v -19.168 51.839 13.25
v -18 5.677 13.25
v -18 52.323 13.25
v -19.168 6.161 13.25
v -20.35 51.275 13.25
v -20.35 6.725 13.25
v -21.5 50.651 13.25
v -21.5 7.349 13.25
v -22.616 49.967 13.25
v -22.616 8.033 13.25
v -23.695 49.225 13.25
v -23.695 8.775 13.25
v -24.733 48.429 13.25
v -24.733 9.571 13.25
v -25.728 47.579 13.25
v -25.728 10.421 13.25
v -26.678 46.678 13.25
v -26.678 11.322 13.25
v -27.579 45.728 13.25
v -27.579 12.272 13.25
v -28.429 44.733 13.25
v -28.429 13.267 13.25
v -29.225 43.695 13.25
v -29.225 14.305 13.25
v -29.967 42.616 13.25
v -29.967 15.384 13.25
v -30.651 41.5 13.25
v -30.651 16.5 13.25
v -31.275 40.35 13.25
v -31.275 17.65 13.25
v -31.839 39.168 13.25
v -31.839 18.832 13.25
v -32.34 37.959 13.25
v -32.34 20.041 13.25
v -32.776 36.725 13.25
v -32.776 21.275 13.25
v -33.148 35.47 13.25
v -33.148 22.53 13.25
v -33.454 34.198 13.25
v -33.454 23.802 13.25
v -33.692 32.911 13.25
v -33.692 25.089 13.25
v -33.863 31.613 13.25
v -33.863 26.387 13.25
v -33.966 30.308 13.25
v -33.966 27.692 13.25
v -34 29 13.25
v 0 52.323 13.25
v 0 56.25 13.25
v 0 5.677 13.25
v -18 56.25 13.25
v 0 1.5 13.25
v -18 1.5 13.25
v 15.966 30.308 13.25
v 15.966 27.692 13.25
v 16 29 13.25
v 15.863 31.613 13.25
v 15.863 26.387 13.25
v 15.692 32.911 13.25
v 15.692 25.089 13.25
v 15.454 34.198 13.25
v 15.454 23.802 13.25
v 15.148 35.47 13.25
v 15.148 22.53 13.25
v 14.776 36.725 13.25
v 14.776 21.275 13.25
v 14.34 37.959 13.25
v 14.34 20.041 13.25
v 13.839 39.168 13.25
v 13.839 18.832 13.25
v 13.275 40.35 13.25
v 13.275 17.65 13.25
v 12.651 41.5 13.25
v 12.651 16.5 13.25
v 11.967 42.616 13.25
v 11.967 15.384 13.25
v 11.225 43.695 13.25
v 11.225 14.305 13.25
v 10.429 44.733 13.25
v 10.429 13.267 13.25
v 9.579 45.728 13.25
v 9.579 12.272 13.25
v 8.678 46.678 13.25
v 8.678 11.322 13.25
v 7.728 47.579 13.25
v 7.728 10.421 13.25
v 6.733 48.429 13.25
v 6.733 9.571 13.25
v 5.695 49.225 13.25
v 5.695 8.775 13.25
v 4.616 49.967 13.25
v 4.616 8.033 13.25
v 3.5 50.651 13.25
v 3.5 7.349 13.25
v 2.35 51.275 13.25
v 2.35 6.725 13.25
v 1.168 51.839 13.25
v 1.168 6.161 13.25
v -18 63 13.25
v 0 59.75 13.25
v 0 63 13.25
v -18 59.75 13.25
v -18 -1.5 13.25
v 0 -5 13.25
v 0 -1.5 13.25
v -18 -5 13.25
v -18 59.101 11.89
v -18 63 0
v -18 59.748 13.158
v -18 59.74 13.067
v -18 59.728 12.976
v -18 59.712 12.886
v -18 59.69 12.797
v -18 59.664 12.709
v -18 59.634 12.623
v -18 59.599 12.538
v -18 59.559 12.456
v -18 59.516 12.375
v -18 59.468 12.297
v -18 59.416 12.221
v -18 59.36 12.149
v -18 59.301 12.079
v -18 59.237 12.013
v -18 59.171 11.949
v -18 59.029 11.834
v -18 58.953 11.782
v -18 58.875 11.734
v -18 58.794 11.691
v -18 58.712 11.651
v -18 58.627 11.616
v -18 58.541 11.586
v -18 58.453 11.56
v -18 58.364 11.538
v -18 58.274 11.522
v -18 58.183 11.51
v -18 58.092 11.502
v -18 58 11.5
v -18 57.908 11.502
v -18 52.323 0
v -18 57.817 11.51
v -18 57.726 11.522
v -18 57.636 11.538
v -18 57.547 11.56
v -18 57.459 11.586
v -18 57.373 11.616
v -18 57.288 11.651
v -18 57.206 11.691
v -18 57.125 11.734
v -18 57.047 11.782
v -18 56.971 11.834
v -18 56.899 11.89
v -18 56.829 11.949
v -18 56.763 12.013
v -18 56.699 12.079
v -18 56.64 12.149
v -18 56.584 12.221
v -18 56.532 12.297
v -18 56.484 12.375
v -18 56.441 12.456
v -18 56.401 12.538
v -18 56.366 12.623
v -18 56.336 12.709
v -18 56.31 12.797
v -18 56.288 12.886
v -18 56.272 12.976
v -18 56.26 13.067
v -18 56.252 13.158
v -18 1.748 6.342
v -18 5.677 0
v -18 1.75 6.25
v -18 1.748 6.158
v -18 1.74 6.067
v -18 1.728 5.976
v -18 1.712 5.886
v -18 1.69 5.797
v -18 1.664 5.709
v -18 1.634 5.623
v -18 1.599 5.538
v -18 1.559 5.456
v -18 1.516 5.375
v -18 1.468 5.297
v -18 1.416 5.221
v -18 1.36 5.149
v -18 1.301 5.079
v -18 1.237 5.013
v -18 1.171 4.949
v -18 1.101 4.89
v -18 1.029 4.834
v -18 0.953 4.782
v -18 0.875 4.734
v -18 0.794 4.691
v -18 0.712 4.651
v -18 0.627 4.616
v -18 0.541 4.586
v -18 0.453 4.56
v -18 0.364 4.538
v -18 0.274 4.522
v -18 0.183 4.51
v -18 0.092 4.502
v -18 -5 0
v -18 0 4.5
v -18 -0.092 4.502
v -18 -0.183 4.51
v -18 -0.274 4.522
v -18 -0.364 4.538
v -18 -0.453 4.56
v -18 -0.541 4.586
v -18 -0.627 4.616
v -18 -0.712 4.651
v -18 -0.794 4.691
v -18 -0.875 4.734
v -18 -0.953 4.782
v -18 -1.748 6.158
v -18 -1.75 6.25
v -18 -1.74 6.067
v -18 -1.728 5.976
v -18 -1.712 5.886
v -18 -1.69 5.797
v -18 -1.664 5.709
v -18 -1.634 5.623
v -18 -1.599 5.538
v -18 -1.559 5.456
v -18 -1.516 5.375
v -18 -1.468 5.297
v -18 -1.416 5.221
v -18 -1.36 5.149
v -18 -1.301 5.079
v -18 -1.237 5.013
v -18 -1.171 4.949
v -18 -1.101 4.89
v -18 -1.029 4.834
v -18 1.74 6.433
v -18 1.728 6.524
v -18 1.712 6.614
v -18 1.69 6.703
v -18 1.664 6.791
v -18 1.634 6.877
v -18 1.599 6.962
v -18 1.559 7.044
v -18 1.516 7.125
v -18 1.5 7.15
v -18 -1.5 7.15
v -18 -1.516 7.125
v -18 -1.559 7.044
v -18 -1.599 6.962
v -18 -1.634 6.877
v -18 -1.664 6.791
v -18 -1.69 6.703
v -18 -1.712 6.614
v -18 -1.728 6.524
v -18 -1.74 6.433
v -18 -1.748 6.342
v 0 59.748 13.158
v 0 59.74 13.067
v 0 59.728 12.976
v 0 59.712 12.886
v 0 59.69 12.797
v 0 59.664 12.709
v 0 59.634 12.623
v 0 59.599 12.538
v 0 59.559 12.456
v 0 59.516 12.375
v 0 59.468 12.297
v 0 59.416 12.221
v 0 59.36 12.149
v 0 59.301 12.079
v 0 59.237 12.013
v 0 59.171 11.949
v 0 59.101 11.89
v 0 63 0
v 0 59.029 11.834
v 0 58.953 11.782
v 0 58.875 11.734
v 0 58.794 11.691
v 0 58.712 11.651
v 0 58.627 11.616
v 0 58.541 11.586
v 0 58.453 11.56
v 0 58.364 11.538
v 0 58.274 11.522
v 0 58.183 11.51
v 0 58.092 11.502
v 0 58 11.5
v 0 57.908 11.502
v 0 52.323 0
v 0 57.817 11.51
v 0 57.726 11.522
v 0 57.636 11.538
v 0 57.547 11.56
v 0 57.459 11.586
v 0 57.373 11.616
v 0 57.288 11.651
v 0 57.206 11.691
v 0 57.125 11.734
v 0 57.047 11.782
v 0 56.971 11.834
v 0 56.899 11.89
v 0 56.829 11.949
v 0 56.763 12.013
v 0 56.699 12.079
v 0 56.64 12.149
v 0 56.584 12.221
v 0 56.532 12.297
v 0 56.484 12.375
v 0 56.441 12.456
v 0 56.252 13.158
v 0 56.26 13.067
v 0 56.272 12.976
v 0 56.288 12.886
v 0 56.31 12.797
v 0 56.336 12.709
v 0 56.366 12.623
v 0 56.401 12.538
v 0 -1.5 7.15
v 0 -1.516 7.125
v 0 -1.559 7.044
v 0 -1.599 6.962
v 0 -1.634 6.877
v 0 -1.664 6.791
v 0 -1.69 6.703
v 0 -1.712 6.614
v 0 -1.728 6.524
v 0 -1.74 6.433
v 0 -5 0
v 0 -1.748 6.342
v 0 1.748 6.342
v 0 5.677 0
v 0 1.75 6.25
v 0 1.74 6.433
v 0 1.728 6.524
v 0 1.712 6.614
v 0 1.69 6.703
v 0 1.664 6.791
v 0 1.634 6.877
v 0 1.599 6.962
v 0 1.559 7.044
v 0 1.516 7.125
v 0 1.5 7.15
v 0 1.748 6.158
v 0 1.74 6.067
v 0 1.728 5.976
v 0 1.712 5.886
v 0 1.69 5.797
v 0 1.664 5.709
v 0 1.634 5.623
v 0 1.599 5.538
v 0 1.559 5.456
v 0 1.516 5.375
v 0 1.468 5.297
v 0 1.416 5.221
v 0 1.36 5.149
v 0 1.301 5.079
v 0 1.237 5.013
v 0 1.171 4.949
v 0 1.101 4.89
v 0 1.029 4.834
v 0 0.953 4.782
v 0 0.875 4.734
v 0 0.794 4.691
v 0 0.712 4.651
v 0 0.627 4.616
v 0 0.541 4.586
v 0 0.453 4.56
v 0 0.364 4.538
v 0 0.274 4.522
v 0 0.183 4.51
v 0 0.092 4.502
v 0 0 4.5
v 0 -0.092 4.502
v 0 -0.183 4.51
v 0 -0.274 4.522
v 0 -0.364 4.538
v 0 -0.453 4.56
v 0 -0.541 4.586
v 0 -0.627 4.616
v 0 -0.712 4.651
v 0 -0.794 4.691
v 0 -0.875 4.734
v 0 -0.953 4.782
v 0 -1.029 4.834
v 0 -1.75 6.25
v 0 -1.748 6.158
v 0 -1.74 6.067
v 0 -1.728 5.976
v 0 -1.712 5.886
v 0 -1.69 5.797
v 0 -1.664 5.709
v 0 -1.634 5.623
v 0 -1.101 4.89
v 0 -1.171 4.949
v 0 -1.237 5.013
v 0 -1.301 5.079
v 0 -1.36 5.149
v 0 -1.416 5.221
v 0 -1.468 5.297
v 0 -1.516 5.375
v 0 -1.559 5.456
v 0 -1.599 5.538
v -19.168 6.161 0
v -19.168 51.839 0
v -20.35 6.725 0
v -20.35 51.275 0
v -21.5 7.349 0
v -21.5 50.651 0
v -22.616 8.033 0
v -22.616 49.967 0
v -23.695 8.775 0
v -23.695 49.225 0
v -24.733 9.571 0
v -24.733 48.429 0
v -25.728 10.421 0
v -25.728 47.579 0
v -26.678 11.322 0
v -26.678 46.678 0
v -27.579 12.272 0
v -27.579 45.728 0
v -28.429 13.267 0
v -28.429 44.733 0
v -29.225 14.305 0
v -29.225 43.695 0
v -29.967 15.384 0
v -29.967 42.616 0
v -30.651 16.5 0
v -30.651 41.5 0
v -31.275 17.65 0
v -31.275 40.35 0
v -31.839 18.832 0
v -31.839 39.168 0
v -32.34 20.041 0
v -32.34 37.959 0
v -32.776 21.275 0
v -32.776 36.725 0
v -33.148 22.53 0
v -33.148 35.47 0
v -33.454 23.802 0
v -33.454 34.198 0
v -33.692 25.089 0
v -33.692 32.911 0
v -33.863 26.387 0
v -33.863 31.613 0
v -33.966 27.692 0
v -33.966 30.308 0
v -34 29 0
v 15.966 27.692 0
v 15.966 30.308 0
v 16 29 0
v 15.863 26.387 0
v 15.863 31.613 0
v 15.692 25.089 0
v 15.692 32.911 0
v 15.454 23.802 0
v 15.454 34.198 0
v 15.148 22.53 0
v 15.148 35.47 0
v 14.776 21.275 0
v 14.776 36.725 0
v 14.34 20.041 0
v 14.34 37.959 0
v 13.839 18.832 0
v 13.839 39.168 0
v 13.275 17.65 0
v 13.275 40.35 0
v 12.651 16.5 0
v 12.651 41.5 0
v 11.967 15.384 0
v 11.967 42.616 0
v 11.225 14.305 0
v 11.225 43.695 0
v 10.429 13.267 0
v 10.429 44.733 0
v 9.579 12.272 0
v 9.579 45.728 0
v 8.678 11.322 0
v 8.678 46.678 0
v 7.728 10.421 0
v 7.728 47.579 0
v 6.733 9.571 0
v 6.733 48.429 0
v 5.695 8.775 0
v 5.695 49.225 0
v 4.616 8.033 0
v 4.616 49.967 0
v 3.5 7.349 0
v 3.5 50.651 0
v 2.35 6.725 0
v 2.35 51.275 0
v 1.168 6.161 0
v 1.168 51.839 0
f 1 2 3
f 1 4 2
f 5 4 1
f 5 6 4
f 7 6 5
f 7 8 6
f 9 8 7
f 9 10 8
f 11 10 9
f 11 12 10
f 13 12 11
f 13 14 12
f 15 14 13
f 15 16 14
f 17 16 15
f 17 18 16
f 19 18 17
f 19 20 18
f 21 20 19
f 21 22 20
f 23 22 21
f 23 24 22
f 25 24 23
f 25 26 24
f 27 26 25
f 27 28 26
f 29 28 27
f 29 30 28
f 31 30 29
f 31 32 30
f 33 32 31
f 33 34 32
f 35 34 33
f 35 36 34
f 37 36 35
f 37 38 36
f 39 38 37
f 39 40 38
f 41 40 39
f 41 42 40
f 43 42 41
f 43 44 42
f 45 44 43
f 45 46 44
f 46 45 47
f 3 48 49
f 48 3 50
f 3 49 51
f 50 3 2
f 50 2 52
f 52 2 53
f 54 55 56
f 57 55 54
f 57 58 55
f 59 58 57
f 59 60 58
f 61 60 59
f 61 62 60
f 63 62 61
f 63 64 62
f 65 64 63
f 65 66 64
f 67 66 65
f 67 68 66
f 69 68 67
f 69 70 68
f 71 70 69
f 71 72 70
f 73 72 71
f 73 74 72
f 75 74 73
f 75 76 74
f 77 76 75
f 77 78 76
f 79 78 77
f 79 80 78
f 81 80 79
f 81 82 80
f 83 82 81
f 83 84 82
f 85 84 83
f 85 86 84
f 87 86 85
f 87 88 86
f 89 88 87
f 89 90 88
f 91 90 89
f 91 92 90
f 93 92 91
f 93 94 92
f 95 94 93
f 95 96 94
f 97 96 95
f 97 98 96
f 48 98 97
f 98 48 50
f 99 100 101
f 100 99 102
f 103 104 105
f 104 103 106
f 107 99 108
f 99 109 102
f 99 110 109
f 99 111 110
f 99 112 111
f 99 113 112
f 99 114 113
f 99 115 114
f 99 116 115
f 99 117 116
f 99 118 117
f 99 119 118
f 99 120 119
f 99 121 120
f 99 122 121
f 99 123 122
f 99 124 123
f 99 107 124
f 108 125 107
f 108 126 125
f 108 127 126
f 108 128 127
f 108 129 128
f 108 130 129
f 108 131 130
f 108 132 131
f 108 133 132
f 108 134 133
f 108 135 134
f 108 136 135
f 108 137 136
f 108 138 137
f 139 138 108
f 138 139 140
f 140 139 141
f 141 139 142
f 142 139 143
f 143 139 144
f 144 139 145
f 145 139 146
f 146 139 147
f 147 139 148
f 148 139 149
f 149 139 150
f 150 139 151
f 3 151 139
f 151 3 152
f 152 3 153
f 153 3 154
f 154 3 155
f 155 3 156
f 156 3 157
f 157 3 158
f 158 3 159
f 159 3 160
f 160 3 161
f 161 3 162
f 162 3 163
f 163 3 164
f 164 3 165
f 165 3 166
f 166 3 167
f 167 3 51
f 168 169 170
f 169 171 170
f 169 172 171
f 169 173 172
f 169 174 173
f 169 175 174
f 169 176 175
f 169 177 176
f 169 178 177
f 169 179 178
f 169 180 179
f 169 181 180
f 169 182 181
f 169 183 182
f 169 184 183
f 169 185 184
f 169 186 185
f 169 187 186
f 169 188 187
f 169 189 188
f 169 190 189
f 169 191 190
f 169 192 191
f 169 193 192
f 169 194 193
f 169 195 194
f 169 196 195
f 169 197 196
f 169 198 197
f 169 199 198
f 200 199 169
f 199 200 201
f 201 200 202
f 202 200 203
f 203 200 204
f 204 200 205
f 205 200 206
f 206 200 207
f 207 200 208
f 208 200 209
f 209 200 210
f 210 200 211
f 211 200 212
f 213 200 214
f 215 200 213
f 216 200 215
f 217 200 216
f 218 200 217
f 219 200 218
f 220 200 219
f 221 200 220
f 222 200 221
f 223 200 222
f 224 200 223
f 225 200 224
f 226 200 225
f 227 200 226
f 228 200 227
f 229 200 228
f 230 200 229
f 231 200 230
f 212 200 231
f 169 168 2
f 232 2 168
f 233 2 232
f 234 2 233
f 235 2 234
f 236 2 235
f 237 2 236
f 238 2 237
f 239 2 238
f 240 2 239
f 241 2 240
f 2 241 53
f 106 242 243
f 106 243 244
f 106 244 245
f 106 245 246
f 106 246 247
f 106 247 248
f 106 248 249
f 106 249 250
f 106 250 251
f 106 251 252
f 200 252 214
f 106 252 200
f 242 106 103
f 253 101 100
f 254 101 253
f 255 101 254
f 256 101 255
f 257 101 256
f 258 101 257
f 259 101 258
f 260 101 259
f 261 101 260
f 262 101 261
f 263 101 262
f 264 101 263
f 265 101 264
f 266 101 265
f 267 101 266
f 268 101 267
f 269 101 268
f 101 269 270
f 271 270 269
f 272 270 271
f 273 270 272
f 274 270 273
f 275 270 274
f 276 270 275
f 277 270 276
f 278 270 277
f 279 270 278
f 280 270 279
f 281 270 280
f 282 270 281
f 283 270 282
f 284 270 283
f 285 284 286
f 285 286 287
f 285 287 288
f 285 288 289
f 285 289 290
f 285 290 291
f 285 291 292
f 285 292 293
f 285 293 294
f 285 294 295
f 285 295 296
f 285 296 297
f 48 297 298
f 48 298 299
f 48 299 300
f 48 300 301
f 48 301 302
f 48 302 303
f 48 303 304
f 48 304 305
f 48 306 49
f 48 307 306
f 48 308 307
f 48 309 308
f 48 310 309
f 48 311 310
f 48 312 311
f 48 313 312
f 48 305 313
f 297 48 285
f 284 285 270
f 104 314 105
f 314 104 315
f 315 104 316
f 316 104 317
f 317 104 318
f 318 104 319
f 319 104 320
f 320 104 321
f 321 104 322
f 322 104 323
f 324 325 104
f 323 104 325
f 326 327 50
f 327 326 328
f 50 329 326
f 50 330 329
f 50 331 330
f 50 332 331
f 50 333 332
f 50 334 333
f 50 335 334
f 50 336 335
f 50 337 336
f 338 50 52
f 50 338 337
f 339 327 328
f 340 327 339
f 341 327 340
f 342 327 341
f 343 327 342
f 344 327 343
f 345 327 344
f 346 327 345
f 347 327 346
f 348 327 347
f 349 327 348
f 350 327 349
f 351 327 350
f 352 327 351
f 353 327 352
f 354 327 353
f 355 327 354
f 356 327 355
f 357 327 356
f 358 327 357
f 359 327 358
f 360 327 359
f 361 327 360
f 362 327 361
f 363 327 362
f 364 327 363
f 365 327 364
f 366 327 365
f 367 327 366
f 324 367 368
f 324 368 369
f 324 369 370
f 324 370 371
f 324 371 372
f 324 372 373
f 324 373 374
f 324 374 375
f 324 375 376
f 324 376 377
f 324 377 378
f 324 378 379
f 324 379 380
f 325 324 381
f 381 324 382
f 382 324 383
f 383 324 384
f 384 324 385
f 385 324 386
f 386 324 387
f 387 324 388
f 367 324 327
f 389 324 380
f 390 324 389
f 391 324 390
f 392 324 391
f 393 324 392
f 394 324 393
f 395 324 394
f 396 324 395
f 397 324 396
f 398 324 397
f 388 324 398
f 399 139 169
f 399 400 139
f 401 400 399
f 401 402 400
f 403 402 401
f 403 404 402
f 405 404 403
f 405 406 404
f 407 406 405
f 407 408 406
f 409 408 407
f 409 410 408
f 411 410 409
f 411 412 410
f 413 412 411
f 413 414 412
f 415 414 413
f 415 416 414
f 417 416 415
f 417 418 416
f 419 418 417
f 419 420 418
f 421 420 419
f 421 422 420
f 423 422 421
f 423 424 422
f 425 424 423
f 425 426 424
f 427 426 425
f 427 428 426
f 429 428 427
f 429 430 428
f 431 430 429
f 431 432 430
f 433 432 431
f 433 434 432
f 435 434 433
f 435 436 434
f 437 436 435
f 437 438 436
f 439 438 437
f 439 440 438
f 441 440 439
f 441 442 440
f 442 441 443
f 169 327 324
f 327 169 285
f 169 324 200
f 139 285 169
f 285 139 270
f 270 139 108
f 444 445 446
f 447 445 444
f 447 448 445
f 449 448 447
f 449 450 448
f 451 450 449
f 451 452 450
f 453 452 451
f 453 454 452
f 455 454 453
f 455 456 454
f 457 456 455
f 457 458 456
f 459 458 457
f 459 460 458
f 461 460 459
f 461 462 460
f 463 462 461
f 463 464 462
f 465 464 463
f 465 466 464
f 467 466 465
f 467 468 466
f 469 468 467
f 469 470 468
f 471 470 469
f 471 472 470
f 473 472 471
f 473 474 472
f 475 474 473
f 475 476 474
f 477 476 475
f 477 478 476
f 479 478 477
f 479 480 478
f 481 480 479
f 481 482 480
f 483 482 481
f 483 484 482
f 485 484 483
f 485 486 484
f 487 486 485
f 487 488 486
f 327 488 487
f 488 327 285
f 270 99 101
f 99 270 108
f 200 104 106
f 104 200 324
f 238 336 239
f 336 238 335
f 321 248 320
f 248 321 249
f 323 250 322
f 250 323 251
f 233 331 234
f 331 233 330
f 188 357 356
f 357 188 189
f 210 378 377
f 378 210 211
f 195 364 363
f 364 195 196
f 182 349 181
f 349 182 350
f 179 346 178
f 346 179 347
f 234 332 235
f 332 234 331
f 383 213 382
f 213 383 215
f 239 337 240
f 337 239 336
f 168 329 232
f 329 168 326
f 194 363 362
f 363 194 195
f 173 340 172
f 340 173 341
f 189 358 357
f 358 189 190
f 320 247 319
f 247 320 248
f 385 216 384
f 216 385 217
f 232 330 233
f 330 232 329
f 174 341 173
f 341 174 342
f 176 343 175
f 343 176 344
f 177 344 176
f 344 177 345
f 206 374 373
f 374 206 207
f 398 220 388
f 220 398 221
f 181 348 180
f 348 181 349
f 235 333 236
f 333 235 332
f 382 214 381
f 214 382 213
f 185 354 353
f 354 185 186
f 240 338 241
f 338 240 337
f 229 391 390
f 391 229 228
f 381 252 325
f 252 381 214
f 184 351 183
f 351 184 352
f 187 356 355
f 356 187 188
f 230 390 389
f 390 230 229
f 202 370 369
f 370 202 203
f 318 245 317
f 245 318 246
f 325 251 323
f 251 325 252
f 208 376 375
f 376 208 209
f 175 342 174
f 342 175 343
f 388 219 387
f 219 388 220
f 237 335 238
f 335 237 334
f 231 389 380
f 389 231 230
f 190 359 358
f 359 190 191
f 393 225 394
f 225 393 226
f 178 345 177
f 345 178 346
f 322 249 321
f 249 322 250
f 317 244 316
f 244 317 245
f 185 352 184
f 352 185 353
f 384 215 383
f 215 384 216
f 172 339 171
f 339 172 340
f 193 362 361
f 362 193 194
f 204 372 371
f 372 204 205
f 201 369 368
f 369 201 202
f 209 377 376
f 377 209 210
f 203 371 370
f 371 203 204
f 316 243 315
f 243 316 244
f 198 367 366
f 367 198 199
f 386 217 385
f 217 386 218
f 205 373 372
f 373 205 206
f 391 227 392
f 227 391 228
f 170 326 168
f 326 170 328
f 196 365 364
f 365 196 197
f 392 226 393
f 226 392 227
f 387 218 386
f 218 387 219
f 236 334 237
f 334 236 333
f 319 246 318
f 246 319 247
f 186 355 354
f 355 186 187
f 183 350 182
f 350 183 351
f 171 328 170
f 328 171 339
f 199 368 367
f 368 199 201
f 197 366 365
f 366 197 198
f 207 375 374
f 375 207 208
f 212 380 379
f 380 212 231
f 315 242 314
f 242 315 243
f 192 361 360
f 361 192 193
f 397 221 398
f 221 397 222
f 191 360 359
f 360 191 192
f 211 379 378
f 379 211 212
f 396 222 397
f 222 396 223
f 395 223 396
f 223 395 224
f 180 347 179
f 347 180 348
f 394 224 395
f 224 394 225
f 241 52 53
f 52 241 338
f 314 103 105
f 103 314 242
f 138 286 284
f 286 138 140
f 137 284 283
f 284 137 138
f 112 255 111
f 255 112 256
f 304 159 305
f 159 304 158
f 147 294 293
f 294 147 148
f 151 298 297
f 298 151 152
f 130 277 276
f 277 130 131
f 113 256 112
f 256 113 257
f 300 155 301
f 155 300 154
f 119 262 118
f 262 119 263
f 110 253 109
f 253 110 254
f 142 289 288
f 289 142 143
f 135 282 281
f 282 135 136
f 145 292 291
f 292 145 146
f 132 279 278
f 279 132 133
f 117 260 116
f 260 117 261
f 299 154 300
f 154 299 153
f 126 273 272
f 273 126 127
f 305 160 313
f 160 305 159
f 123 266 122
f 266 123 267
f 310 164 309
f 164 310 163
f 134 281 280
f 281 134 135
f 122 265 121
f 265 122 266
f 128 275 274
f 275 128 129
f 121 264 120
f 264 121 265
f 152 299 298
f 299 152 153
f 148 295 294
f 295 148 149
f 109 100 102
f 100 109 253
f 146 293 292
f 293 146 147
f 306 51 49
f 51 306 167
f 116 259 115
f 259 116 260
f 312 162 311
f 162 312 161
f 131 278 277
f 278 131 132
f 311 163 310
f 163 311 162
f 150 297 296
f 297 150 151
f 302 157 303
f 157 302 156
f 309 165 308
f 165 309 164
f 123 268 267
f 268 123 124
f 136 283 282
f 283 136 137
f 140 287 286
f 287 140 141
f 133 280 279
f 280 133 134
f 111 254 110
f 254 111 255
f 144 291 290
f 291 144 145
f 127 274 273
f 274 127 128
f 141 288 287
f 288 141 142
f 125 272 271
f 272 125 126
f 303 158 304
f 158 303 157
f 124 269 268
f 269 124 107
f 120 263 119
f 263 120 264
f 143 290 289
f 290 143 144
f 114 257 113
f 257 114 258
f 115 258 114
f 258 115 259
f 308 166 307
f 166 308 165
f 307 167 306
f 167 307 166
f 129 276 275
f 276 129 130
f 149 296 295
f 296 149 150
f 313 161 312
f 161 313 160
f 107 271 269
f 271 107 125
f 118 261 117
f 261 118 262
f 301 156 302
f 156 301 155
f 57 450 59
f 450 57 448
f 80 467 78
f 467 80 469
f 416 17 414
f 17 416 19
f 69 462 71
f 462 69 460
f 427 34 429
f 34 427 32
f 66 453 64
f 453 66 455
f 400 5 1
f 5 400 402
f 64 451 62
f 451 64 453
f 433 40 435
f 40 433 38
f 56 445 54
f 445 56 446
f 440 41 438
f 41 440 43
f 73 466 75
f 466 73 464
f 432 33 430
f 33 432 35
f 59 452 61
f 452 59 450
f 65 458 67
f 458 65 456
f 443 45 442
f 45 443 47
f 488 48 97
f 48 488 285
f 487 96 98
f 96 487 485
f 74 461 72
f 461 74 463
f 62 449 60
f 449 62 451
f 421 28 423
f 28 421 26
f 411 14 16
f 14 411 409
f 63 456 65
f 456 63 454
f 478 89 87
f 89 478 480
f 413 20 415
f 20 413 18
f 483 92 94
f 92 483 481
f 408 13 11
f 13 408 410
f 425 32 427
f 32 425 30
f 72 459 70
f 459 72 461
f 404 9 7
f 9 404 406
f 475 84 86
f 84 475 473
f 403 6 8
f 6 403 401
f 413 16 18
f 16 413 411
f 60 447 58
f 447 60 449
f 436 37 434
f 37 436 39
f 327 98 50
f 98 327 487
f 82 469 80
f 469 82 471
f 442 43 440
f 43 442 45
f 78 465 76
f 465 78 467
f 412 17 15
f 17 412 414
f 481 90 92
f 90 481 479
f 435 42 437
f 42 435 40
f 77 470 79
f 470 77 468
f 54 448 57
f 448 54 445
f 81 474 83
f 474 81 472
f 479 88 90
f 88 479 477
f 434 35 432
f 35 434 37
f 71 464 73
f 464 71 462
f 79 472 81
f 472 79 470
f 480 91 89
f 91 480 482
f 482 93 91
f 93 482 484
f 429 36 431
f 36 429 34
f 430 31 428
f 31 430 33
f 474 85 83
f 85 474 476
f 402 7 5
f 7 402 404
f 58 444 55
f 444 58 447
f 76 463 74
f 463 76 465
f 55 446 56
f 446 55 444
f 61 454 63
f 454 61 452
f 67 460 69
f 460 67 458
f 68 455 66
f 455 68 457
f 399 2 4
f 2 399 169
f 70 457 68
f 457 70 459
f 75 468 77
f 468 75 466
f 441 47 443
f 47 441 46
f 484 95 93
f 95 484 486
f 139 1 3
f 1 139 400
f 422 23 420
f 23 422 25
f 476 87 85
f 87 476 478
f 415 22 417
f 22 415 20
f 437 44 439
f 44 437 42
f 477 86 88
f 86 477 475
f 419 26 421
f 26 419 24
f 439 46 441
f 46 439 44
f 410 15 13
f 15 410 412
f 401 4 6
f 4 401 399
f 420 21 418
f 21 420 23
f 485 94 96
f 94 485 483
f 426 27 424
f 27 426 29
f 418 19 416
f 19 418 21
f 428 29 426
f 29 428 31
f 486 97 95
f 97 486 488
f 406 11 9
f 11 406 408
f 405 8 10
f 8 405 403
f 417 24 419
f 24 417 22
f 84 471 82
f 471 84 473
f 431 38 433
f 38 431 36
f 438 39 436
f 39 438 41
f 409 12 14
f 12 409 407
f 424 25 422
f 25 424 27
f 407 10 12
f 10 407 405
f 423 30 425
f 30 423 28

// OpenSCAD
inner_diameter = 46;
fins = 3;
fin_thickness = 2;
fin_height = 3;

bar_width = 18;
bar_height_low = 4.5;
bar_height_high = 11.5;
bar_length = 58;
bar_cut_out = 0;
bar_hole = 3.5;
bar_slot = 3.0;
bar_cross_length = 50;
bar_cross_offset = 0;

$fn=120;

module fin() {
  union() {
    difference() {
      cylinder(
        d1=(inner_diameter - 2 * fin_height),
        d2=inner_diameter, h=fin_height
      );
      translate([0, 0, fin_thickness]) {
        cylinder(
          d1=(inner_diameter - 2 * fin_height),
          d2=inner_diameter, h=fin_height
        );
      }
    }
    cylinder(d=(inner_diameter - 2 * fin_height), h=fin_height + 1);
  }
}

module seal() {
  difference() {
    union() {
      for (i = [0:fins]) {
        translate([0, 0, i * fin_height]) {
          fin();
        }
      }

      // top
      translate([0, 0, fin_height * (fins + 1)]) {
        cylinder(
          d1=inner_diameter - 2 * fin_height,
          d2=inner_diameter + fin_height + 1, h=1.5 * fin_height
        );
      }

      translate([0, 0, fin_height * (fins + 2.5)]) {
        cylinder(d=inner_diameter + fin_height + 1, h=fin_height * 2);
      }
    }

    // hole
    translate([0, 0, fin_thickness]) {
      cylinder(
        d=inner_diameter - 3 * fin_height,
        h=fins * fin_height + fin_height * 4.5 - fin_thickness
      );
    }
  }
}

module bar() {
  difference() {
    translate([0, -5, 0]) {
      cube([bar_height_high + bar_hole / 2, 10 + bar_length, bar_width]);
    }
    translate([bar_height_low + bar_hole / 2, 0, 0]) {
      cylinder(d=bar_hole, h=bar_width);
    }
    translate([bar_height_low + bar_hole / 2, bar_slot / -2, 0]) {
      cube([bar_height_high - bar_height_low, bar_slot, bar_width]);
    }
    translate([bar_height_high + bar_hole / 2, bar_length, 0]) {
      cylinder(d=bar_hole, h=bar_width);
    }
    translate([0, 5, 0]) {
      cube([bar_cut_out, 15, bar_width]);
    }
    translate([0, bar_length - 25, 0]) {
         cube([bar_cut_out, 15, bar_width]);
    }
  }

  // cross
  translate([0, bar_length / 2 - bar_cross_offset, bar_width / 2]) {
    rotate([0, 90, 0]) {
      cylinder(d=bar_cross_length, h=bar_height_high + bar_hole / 2);
    }
  }
}

rotate([0, -90, 0]) {
  bar();
}

// seal();
